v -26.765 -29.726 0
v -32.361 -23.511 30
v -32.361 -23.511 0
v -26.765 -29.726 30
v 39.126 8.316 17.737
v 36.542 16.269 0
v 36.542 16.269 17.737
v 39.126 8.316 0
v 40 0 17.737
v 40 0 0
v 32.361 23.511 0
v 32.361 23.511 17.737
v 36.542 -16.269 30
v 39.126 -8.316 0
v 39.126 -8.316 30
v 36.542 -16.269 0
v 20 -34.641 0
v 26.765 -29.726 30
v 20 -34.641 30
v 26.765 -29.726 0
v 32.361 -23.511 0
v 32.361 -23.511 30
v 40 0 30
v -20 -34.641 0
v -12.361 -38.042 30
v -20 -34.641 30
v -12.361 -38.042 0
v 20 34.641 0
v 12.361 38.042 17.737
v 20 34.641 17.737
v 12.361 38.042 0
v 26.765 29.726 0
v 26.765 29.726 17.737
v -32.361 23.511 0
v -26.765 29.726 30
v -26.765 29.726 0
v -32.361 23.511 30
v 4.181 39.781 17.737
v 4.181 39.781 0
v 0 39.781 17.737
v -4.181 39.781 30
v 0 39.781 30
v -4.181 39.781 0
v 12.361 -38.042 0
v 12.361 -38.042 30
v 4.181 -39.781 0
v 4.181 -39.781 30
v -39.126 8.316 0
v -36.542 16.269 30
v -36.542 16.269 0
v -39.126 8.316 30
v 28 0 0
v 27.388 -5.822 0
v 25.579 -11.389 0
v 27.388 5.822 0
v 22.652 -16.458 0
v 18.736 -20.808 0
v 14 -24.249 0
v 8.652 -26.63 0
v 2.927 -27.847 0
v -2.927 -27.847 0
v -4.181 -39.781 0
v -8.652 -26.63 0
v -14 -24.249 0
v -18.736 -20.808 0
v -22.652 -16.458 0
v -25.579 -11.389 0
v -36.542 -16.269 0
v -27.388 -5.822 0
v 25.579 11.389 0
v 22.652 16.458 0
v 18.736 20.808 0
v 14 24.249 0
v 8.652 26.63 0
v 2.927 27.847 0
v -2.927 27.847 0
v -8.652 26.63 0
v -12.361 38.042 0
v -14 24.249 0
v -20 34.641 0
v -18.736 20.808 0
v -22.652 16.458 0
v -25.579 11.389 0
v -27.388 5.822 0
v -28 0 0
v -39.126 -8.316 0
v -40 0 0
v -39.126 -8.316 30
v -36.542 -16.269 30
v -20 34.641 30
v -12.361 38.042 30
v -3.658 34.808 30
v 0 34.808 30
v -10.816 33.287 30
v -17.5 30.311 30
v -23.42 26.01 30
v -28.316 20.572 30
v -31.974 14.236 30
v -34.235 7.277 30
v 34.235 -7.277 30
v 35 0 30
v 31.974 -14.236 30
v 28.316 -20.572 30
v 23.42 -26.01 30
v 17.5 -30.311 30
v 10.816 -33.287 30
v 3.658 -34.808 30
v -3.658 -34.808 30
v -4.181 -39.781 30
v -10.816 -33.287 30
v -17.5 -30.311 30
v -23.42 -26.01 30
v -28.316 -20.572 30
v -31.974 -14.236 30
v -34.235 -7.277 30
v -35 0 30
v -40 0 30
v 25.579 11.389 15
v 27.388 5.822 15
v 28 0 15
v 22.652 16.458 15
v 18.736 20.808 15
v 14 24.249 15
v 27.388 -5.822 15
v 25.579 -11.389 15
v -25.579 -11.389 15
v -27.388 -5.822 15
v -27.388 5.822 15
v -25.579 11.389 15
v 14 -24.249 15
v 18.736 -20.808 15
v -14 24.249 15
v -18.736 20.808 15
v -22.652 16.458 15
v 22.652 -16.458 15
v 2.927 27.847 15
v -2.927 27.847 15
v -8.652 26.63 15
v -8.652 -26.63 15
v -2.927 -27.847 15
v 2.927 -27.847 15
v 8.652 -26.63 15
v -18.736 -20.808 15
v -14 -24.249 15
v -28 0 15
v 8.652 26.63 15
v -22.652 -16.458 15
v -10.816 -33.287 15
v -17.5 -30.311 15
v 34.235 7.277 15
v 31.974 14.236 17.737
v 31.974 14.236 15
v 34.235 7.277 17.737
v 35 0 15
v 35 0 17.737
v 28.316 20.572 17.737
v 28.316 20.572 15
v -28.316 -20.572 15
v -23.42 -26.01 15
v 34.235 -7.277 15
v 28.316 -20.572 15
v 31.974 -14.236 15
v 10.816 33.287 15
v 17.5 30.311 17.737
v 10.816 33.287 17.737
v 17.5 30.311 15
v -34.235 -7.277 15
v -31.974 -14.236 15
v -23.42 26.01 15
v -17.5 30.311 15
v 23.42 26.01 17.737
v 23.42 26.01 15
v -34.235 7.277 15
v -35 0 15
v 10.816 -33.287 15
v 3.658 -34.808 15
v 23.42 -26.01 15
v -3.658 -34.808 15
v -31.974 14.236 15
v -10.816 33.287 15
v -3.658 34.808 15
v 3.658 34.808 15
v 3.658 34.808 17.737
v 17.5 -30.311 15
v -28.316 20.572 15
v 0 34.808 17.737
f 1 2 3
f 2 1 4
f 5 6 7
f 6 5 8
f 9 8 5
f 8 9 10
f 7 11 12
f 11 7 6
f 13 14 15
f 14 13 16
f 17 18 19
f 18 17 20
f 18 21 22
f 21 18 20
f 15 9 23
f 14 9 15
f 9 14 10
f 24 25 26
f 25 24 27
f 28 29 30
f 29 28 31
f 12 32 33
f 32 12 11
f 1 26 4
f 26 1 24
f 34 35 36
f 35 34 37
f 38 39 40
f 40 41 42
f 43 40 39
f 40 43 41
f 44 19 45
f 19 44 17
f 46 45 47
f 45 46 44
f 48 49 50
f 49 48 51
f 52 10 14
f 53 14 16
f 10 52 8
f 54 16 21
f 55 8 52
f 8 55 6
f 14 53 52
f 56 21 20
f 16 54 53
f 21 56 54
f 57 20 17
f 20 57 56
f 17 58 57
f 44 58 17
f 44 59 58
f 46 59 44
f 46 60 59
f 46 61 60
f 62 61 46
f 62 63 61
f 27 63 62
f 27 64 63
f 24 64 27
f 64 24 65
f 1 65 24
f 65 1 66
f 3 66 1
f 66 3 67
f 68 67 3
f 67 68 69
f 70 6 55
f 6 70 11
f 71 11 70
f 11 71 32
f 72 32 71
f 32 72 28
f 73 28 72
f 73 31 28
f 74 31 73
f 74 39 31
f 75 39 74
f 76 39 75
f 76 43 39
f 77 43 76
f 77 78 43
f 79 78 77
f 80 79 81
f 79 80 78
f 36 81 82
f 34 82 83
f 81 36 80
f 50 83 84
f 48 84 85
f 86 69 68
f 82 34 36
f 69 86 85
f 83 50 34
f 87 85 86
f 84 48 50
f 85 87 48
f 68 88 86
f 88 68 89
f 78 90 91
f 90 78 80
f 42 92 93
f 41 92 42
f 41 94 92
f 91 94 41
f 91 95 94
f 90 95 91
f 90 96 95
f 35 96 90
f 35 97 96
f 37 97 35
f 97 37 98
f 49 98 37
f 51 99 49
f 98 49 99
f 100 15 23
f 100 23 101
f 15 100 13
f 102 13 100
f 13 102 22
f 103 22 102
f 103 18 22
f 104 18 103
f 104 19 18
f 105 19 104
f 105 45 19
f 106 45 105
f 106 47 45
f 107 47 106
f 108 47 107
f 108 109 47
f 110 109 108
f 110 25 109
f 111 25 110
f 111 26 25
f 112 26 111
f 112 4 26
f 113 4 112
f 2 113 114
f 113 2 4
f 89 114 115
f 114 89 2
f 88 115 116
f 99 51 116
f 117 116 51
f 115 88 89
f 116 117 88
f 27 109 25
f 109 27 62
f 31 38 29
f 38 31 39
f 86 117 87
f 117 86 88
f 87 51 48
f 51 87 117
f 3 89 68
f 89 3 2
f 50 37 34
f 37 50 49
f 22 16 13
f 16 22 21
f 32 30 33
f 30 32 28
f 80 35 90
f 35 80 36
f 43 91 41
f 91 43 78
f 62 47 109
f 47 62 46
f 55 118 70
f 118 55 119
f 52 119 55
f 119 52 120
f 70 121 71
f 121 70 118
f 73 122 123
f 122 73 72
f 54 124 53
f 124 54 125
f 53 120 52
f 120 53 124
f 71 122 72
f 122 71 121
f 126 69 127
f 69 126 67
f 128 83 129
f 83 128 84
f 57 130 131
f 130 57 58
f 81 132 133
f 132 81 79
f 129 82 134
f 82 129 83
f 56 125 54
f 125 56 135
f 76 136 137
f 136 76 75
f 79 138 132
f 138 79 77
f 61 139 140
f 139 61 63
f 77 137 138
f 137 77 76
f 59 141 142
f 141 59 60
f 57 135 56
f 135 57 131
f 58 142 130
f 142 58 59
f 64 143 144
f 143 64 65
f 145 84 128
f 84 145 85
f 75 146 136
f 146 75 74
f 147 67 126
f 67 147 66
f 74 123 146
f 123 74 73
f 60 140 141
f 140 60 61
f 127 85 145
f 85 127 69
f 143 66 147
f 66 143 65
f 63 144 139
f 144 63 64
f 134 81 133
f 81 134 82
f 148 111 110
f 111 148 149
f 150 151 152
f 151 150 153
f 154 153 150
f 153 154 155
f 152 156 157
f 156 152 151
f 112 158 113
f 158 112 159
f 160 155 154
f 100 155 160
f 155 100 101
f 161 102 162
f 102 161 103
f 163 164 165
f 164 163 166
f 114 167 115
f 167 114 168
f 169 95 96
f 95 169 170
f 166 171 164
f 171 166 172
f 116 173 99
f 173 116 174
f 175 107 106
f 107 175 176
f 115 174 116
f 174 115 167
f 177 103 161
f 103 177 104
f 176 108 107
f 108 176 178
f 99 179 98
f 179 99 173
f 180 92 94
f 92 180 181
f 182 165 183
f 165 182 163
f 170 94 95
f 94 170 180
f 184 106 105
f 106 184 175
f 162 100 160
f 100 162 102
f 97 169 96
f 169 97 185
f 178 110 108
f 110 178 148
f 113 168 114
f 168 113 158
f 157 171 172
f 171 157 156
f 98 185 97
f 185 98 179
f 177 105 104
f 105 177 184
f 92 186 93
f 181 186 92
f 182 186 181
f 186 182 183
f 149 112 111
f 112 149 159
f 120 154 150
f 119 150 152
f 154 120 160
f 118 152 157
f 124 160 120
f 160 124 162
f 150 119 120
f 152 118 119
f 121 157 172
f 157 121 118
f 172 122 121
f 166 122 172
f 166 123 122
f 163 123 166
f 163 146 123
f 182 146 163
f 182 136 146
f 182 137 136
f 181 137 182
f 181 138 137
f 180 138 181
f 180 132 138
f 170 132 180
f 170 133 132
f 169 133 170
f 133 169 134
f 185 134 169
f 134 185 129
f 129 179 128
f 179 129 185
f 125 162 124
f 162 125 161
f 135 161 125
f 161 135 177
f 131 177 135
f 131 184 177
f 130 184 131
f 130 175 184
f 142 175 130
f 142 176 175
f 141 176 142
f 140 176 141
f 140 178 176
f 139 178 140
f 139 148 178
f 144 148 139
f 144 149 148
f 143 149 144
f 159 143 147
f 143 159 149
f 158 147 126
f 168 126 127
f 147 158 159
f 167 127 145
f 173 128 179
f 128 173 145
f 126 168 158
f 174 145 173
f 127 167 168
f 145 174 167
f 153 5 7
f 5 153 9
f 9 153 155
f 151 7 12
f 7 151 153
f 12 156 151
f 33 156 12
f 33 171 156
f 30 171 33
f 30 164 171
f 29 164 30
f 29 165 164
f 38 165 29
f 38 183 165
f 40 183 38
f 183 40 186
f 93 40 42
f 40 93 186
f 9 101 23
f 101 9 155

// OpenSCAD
// Peristaltic Planetary Gear Pump

include <MCAD/involute_gears.scad>

render_part=0; // full_assembly
// render_part=1; // drive_gears
// render_part=2; // alignment_gears
// render_part=3; // pressure_rollers
// render_part=4; // outer_pressure_ring
// render_part=5; // roller_retainer_ring
// render_part=6; // roller_gear_coupler2bearing_group
// render_part=7; // pressure_roller_coupler2bearing_group 
render_part=8; // pump_body

module spider_coupler(
	thickness=5.0
	, outer_d=12.0
	, axle_d=3.0
	, bevel_dr=0.5
	, shrink=0.2
	) {
  intersection() {
    union() {
      cylinder(r=outer_d/2,h=thickness-bevel_dr,center=false);
      translate([0,0,thickness-bevel_dr])
        cylinder(r1=outer_d/2,r2=outer_d/2-bevel_dr,h=bevel_dr,center=false);
    }
    difference() {
      union() {
	  translate([shrink,shrink])
		cube(size=[outer_d/2-shrink,outer_d/2-shrink,thickness],center=false);
	  rotate([0,0,180]) translate([shrink,shrink,0])
		cube(size=[outer_d/2-shrink,outer_d/2-shrink,thickness],center=false);
	 }
	 union() {
	  translate([0,0,-bevel_dr]) cylinder(r=axle_d/2,h=thickness+2*bevel_dr,center=false);
	  translate([0,0,thickness-bevel_dr])  cylinder(r2=axle_d/2+2*bevel_dr,r1=axle_d/2,h=2*bevel_dr,center=false);
	  translate([0,0,thickness]) rotate([45,0,0]) cube(size=[outer_d,2*bevel_dr,2*bevel_dr],center=true);
	  translate([0,0,thickness]) rotate([45,0,90]) cube(size=[outer_d,2*bevel_dr,2*bevel_dr],center=true);
	 }
    }
  }
}

module roller_drive_gear(
	gear_d=20.0, gear_num_teeth=17, gear_spacing=1.0
	, roller_gear_thickness=10.0, motor_gear_thickness=12.0
	, roller_gear_hub_thickness=15.0, motor_gear_hub_thickness=17.0
	, roller_gear_hub_d=12.0, motor_gear_hub_d=15.0
	, roller_axle_d=3.0, motor_axle_d=5.0
	, roller_gear_count=3
	, gear_clearance=0.4
	, twist_ratio=0.5, bevel_dr=0.5
	) {
  $fs=0.1;
  gear_circular_pitch=gear_d * 180 / gear_num_teeth;
  difference() {
    intersection() {
	gear(number_of_teeth=gear_num_teeth
		, circular_pitch=gear_circular_pitch
		, gear_thickness=roller_gear_thickness, rim_thickness=roller_gear_thickness
		, bore_diameter=roller_axle_d
		, clearance=gear_clearance/2
		, hub_thickness=0
		, hub_diameter=roller_gear_hub_d
		);
	cylinder(r1=gear_d/2,r2=gear_d/2+roller_gear_thickness,h=roller_gear_thickness,center=false);
	cylinder(r2=gear_d/2,r1=gear_d/2+roller_gear_thickness,h=roller_gear_thickness,center=false);
    }
    translate([0,0,gear_thickness+bevel_dr]) rotate([180,0,0])
	    translate([0,0,-bevel_dr]) spider_coupler( thickness=(roller_gear_hub_thickness-roller_gear_thickness)/2+2*bevel_dr
		, outer_d=gear_hub_d+2*bevel_dr, axle_d=roller_axle_d-2*bevel_dr, bevel_dr=bevel_dr/2,shrink=-0.2 );
  }
  translate([0,0,gear_thickness]) 
	  spider_coupler( thickness=(roller_gear_hub_thickness-roller_gear_thickness)/2
		, outer_d=gear_hub_d, axle_d=roller_axle_d, bevel_dr=bevel_dr,shrink=0.2 );
}

module drive_gears(
	gear_d=20.0, gear_num_teeth=17, gear_spacing=1.0
	, roller_gear_thickness=10.0, motor_gear_thickness=12.0
	, roller_gear_hub_thickness=15.0, motor_gear_hub_thickness=17.0
	, roller_gear_hub_d=12.0, motor_gear_hub_d=15.0
	, roller_axle_d=3.0, motor_axle_d=5.0
	, roller_gear_count=3
	, gear_clearance=0.4
	, twist_ratio=0.5, bevel_dr=0.5
	) {
  $fs=0.1;
  // Motor gear at center
  gear_circular_pitch=gear_d * 180 / gear_num_teeth;
  intersection() {
    gear(number_of_teeth=gear_num_teeth
	, circular_pitch=gear_circular_pitch
	, gear_thickness=motor_gear_thickness, rim_thickness=motor_gear_thickness
	, bore_diameter=motor_axle_d
	, clearance=gear_clearance/2
	, hub_thickness=motor_gear_hub_thickness
	, hub_diameter=motor_gear_hub_d
	);
    cylinder(r1=gear_d/2,r2=gear_d/2+motor_gear_hub_thickness,h=motor_gear_hub_thickness,center=false);
//    cylinder(r2=gear_d/2,r1=gear_d/2+motor_gear_thickness,h=motor_gear_thickness,center=false);
  }
  for(i=[0:roller_gear_count-1]) assign( rotAngle=360*i/roller_gear_count ) {
    rotate([0,0,rotAngle]) translate([gear_d+gear_clearance+gear_spacing,0,0]) rotate([0,0,-2*rotAngle])
	  roller_drive_gear(
		gear_d=gear_d, gear_num_teeth=gear_num_teeth, gear_thickness=roller_gear_thickness, gear_spacing=gear_spacing
		, gear_hub_thickness=roller_gear_hub_thickness, gear_hub_d=roller_gear_hub_d, roller_axle_d=roller_axle_d
		, gear_clearance=gear_clearance, twist_ratio=twist_ratio, bevel_dr=bevel_dr
	  );

  }
}

if(render_part==1) {
  echo("Rendering drive_gears()...");
  drive_gears(gear_spacing=2.0);
}

module alignment_gear_middle(
	gear_d=20.0, gear_num_teeth=17, gear_thickness=12.0, gear_spacing=1.0
	, gear_hub_thickness=15.0, gear_hub_d=12.0, middle_axle_d=5.0
	, gear_clearance=0.4, twist_ratio=0.5, bevel_dr=0.5
	) {
  $fs=0.1;
  gear_circular_pitch=gear_d * 180 / gear_num_teeth;
  union() {
    intersection() {
	gear(number_of_teeth=gear_num_teeth
	  , circular_pitch=gear_circular_pitch
	  , gear_thickness=gear_thickness/2, rim_thickness=gear_thickness/2
	  , bore_diameter=middle_axle_d
	  , clearance=gear_clearance/2
	  , hub_thickness=0
	  , hub_diameter=gear_hub_d
	  , twist=twist_ratio*180/gear_num_teeth
	  );
	cylinder(r1=gear_d/2,r2=gear_d/2+gear_thickness/2,h=gear_thickness/2,center=false);
	cylinder(r2=gear_d/2,r1=gear_d/2+gear_thickness/2,h=gear_thickness/2,center=false);
    }
    translate([0,0,gear_thickness/2]) rotate([0,0,-twist_ratio*180/gear_num_teeth]) difference() {
	intersection() {
	  gear(number_of_teeth=gear_num_teeth
		, circular_pitch=gear_circular_pitch
		, gear_thickness=gear_thickness/2, rim_thickness=gear_thickness/2
		, bore_diameter=middle_axle_d
		, clearance=gear_clearance/2
		, hub_thickness=0
		, hub_diameter=gear_hub_d
		, twist=-twist_ratio*180/gear_num_teeth
		);
	  cylinder(r1=gear_d/2,r2=gear_d/2+gear_thickness/2,h=gear_thickness/2,center=false);
	  cylinder(r2=gear_d/2,r1=gear_d/2+gear_thickness/2,h=gear_thickness/2,center=false);
	}
	  translate([0,0,gear_thickness/2]) rotate([180,0,twist_ratio*180/gear_num_teeth])
	    translate([0,0,-bevel_dr]) spider_coupler( thickness=(gear_hub_thickness-gear_thickness)/2+2*bevel_dr
		, outer_d=gear_hub_d+2*bevel_dr, axle_d=middle_axle_d-2*bevel_dr, bevel_dr=bevel_dr/2,shrink=-0.2 );
	}
	translate([0,0,gear_thickness]) 
	  spider_coupler( thickness=(gear_hub_thickness-gear_thickness)/2
		, outer_d=gear_hub_d, axle_d=middle_axle_d, bevel_dr=bevel_dr,shrink=0.2 );
  }
}

module alignment_gear_roller(
	gear_d=20.0, gear_num_teeth=17, gear_thickness=12.0, gear_spacing=1.0
	, gear_hub_thickness=15.0, gear_hub_d=12.0
	, roller_axle_d=3.0
	, roller_gear_count=3
	, gear_clearance=0.4
	, twist_ratio=0.5
	, bevel_dr=0.5
	) {
  $fs=0.1;
  gear_circular_pitch=gear_d * 180 / gear_num_teeth;
  intersection() {
	gear(number_of_teeth=gear_num_teeth
		, circular_pitch=gear_circular_pitch
		, gear_thickness=gear_thickness/2, rim_thickness=gear_thickness/2
		, bore_diameter=roller_axle_d
		, clearance=gear_clearance/2
		, hub_thickness=0
		, hub_diameter=gear_hub_d
		, twist=-twist_ratio*180/gear_num_teeth
		);
	cylinder(r1=gear_d/2,r2=gear_d/2+gear_thickness/2,h=gear_thickness/2,center=false);
	cylinder(r2=gear_d/2,r1=gear_d/2+gear_thickness/2,h=gear_thickness/2,center=false);
  }
  translate([0,0,gear_thickness/2]) rotate([0,0,twist_ratio*180/gear_num_teeth]) difference() {
    intersection() {
	  gear(number_of_teeth=gear_num_teeth
		, circular_pitch=gear_circular_pitch
		, gear_thickness=gear_thickness/2, rim_thickness=gear_thickness/2
		, bore_diameter=roller_axle_d
		, clearance=gear_clearance/2
		, hub_thickness=0
		, hub_diameter=gear_hub_d
		, twist=twist_ratio*180/gear_num_teeth
	  );
	cylinder(r1=gear_d/2,r2=gear_d/2+gear_thickness/2,h=gear_thickness/2,center=false);
	cylinder(r2=gear_d/2,r1=gear_d/2+gear_thickness/2,h=gear_thickness/2,center=false);
    }
    translate([0,0,gear_thickness/2]) rotate([180,0,-twist_ratio*180/gear_num_teeth])
      translate([0,0,-bevel_dr]) spider_coupler( thickness=(gear_hub_thickness-gear_thickness)/2+2*bevel_dr
		, outer_d=gear_hub_d+2*bevel_dr, axle_d=roller_axle_d-2*bevel_dr, bevel_dr=bevel_dr/2,shrink=-0.2 );
  }
	translate([0,0,gear_thickness]) 
	  spider_coupler( thickness=(gear_hub_thickness-gear_thickness)/2
		, outer_d=gear_hub_d, axle_d=roller_axle_d, bevel_dr=bevel_dr );
}

module alignment_gears(
	gear_d=20.0, gear_num_teeth=17, gear_thickness=12.0, gear_spacing=1.0
	, gear_hub_thickness=15.0, gear_hub_d=12.0
	, roller_axle_d=3.0, middle_axle_d=5.0
	, roller_gear_count=3
	, gear_clearance=0.4
	, twist_ratio=0.5
	, bevel_dr=0.5
	) {
  $fs=0.1;
  gear_circular_pitch=gear_d * 180 / gear_num_teeth;
  // Motor gear at center
  alignment_gear_middle(
	gear_d=gear_d, gear_num_teeth=gear_num_teeth, gear_thickness=gear_thickness, gear_spacing=gear_spacing
	, gear_hub_thickness=gear_hub_thickness, gear_hub_d=gear_hub_d, middle_axle_d=middle_axle_d
	, gear_clearance=gear_clearance, twist_ratio=twist_ratio, bevel_dr=bevel_dr
	);
  for(i=[0:roller_gear_count-1]) assign( rotAngle=360*i/roller_gear_count ) {
    rotate([0,0,rotAngle]) translate([gear_d+gear_clearance+gear_spacing,0,0]) rotate([0,0,-2*rotAngle])
	  alignment_gear_roller(
		gear_d=gear_d, gear_num_teeth=gear_num_teeth, gear_thickness=gear_thickness, gear_spacing=gear_spacing
		, gear_hub_thickness=gear_hub_thickness, gear_hub_d=gear_hub_d, roller_axle_d=roller_axle_d
		, gear_clearance=gear_clearance, twist_ratio=twist_ratio, bevel_dr=bevel_dr
	  );
  }
}

if(render_part==2) {
  echo("Rendering alignment_gears()...");
  alignment_gears(gear_spacing=2.0);
}

module pressure_roller(
	roller_axle_d=3.0, roller_thickness=15.0
	, roller_coupler_thickness=3.0, roller_coupler_d=12.0
	, roller_shield_d=20.0, roller_shield_thickness=3.0
	, roller_min_d=15.0, roller_max_d=18.0
	, bevel_dr=0.5
	) {
  $fs=0.1;
  difference() {
    union() {
	cylinder(r=roller_max_d/2,h=roller_shield_thickness,center=false);
	translate([0,0,roller_shield_thickness])
	  cylinder(r1=roller_max_d/2,r2=roller_min_d/2,h=roller_thickness,center=false);
	translate([0,0,roller_shield_thickness+roller_thickness])
	  cylinder(r=roller_min_d/2,h=roller_shield_thickness,center=false);
//	translate([0,0,roller_shield_thickness+roller_thickness+(roller_shield_d/2-roller_min_d/2)])
//	  cylinder(r=roller_shield_d/2,h=roller_shield_thickness-(roller_shield_d/2-roller_min_d/2),center=false);
	translate([0,0,2*roller_shield_thickness+roller_thickness])
	  spider_coupler( thickness=roller_coupler_thickness/2
		, outer_d=roller_coupler_d, axle_d=roller_axle_d, bevel_dr=bevel_dr,shrink=0.2 );
    }
    translate([0,0,-bevel_dr]) cylinder(r=roller_axle_d/2
	,h=2*bevel_dr+2*roller_shield_thickness+roller_thickness,center=false);
    translate([0,0,-bevel_dr]) spider_coupler( thickness=roller_coupler_thickness/2+2*bevel_dr
		, outer_d=roller_coupler_d+2*bevel_dr, axle_d=roller_axle_d-2*bevel_dr, bevel_dr=bevel_dr/2,shrink=-0.2 );
    translate([0,0,2*roller_shield_thickness+roller_thickness+bevel_dr]) rotate([180,0,0])
	  spider_coupler( thickness=roller_coupler_thickness/2+2*bevel_dr
		, outer_d=roller_coupler_d+2*bevel_dr, axle_d=roller_axle_d-2*bevel_dr, bevel_dr=bevel_dr/2,shrink=-0.2 );
  }
}

module pump_pressure_rollers(
	roller_axle_d=3.0, roller_thickness=15.0
	, roller_coupler_thickness=3.0, roller_coupler_d=12.0
	, roller_shield_d=20.0, roller_shield_thickness=3.0
	, roller_min_d=15.0, roller_max_d=18.0
	, pressure_roller_count=3
	, bevel_dr=0.5
	, gear_d=20.0, gear_clearance=0.4, gear_spacing=1.0
	) {
  $fs=0.1;
  for(i=[0:pressure_roller_count-1]) assign( rotAngle=360*i/pressure_roller_count ) {
    rotate([0,0,rotAngle]) translate([gear_d+gear_clearance+gear_spacing,0,0]) rotate([0,0,-2*rotAngle])
	  pressure_roller(
		roller_axle_d=roller_axle_d, roller_thickness=roller_thickness
		, roller_coupler_thickness=roller_coupler_thickness, roller_coupler_d=roller_coupler_d
		, roller_shield_d=roller_shield_d, roller_shield_thickness=roller_shield_thickness
		, roller_min_d=roller_min_d, roller_max_d=roller_max_d
		, bevel_dr=bevel_dr
	  );
  }
}

if(render_part==3) {
  echo("Rendering pump_pressure_rollers()...");
  pump_pressure_rollers(gear_spacing=2.0);
}

function Tygon_B_44_3_OD()=25.4*3/16; // Outer Diameter
function Tygon_B_44_3_ID()=25.4*1/16; // Inner Diameter
function Tygon_B_44_3_WT()=25.4*1/16; // Wall Thickness
function Tygon_B_44_3_minBR()=25.4*1/8; // minimum Bend Radius

module outer_pressure_ring(
	roller_axle_d=3.0, roller_thickness=15.0
	, roller_coupler_thickness=3.0, roller_coupler_d=12.0
	, roller_shield_d=20.0, roller_shield_thickness=3.0
	, roller_min_d=15.0, roller_max_d=18.0
	, pressure_roller_count=3
	, bevel_dr=0.5
	, gear_d=20.0, gear_clearance=0.4, gear_spacing=1.0
	, tube_outer_d=Tygon_B_44_3_OD()
	, tube_inner_d=Tygon_B_44_3_ID()
	, hole_ext=0.01
	) {
  $fs=0.1;
  dr1=gear_d+roller_min_d/2+tube_outer_d-tube_inner_d;
  dr2=gear_d+roller_max_d/2+tube_outer_d-tube_inner_d;
  difference() {
    cylinder(r=gear_d+3*roller_shield_d/4,h=3*roller_thickness/2,center=false);
    translate([0,0,-hole_ext]) cylinder(r=dr2,h=3*roller_thickness/2+2*hole_ext,center=false);
    translate([0,0,roller_thickness/8+roller_thickness/2-tube_outer_d])
	cube(size=[gear_d+roller_shield_d+2*bevel_dr,gear_d+roller_shield_d+2*bevel_dr,2*tube_outer_d],center=false);
  }
  // bottom section
  difference() {
    cylinder(r=gear_d+roller_shield_d,h=roller_thickness/8,center=false);
    translate([0,0,-hole_ext]) cylinder(r=gear_d+roller_min_d/2+bevel_dr,h=roller_thickness/8+2*hole_ext,center=false);
  }
  translate([0,0,roller_thickness/8]) difference() {
    cylinder(r=gear_d+3*roller_shield_d/4,h=roller_thickness/2-tube_outer_d,center=false);
    cylinder(r1=gear_d+roller_min_d/2+bevel_dr,r2=dr1+(dr2-dr1)*(roller_thickness/2-tube_outer_d)/roller_thickness
	  ,h=roller_thickness/2-tube_outer_d,center=false);
    cylinder(r=gear_d+roller_min_d/2+bevel_dr,h=hole_ext,center=true);
    translate([0,0,roller_thickness/2-tube_outer_d]) cylinder(r=dr1+(dr2-dr1)*(roller_thickness/2-tube_outer_d)/roller_thickness,h=hole_ext,center=true);
  }
  translate([0,0,roller_thickness/8+roller_thickness/2-tube_outer_d]) difference() {
    cylinder(r=gear_d+3*roller_shield_d/4,h=2*tube_outer_d,center=false);
    translate([0,0,tube_outer_d]) cylinder(r1=dr1,r2=dr2,h=roller_thickness,center=true);
    cube(size=[gear_d+roller_shield_d+2*bevel_dr,gear_d+roller_shield_d+2*bevel_dr,2*tube_outer_d],center=false);
  }
//  translate([0,0,roller_thickness/8+roller_thickness/2+tube_outer_d]) difference() {
//    cylinder(r=gear_d+3*roller_shield_d/4,h=roller_thickness/2-tube_outer_d, center=false);
//    cylinder(r1=dr1+(dr2-dr1)*(roller_thickness/2+tube_outer_d)/roller_thickness
//	    ,r2=gear_d+roller_max_d/2+bevel_dr,h=roller_thickness/2-tube_outer_d+bevel_dr,center=false);
//  }
//  translate([0,0,9*roller_thickness/8]) difference() {
//    cylinder(r=gear_d+3*roller_shield_d/4,h=roller_thickness/4,center=false);
//    translate([0,0,-bevel_dr]) cylinder(r=gear_d+roller_max_d/2+2*bevel_dr,h=roller_thickness/4+2*bevel_dr,center=false);
//  }
}

if(render_part==4) {
  echo("Rendering outer_pressure_ring()...");
  % translate([0,0,23]) rotate([180,0,0]) pump_pressure_rollers(gear_spacing=0.0);
  outer_pressure_ring(gear_spacing=0.0);
}

function Bearing_623_OD()=10.0; // outer diameter
function Bearing_623_ID()=3.0; // inner diameter
function Bearing_623_TH()=4.0; // thickness


module roller_retainer_ring(
	roller_axle_d=3.0, roller_thickness=15.0
	, roller_coupler_thickness=3.0, roller_coupler_d=12.0
	, roller_shield_d=20.0, roller_shield_thickness=3.0
	, roller_min_d=15.0, roller_max_d=18.0
	, pressure_roller_count=3
	, bevel_dr=0.5
	, gear_d=20.0, gear_clearance=0.4, gear_spacing=1.0
	, tube_outer_d=Tygon_B_44_3_OD()
	, tube_inner_d=Tygon_B_44_3_ID()
	, hole_ext=0.01
	, roller_bearing_od=Bearing_623_OD(), roller_bearing_th=Bearing_623_TH()
	) {
  $fs=0.1;
  difference() {
    cylinder(r=gear_d+roller_min_d/2,h=roller_bearing_th,center=false);
    cylinder(r=gear_d-roller_shield_d/2,h=roller_bearing_th,center=false);
    cylinder(r1=gear_d-roller_shield_d/2+3*bevel_dr,r2=gear_d-roller_shield_d/2,h=3*bevel_dr,center=true);
    translate([0,0,roller_bearing_th])
      cylinder(r2=gear_d-roller_shield_d/2+3*bevel_dr,r1=gear_d-roller_shield_d/2,h=3*bevel_dr,center=true);

    for(i=[0:pressure_roller_count-1]) assign( rotAngle=360*i/pressure_roller_count ) {
      rotate([0,0,rotAngle]) translate([gear_d,0,0]) {
	  cylinder(r=roller_bearing_od/2,h=roller_bearing_th,center=false);
	  cylinder(r1=roller_bearing_od/2+2*bevel_dr,r2=roller_bearing_od/2,h=2*bevel_dr,center=true);
	  translate([0,0,roller_bearing_th])
	    cylinder(r2=roller_shield_d/2+3*bevel_dr,r1=roller_shield_d/2+bevel_dr,h=2*bevel_dr,center=true);
      }
    }
  }
}

if(render_part==5) {
  echo("Rendering roller_retainer_ring()...");
  % translate([0,0,30]) rotate([180,0,0]) pump_pressure_rollers(gear_spacing=0.0);
  roller_retainer_ring(gear_spacing=0.0);
}

module roller_gear_coupler2bearing(
	roller_axle_d=3.0, roller_thickness=15.0
	, roller_coupler_thickness=3.0, roller_coupler_d=12.0
	, roller_shield_d=20.0, roller_shield_thickness=3.0
	, roller_min_d=15.0, roller_max_d=18.0
	, pressure_roller_count=3
	, bevel_dr=0.5
	, gear_d=20.0, gear_clearance=0.4, gear_spacing=1.0
	, tube_outer_d=Tygon_B_44_3_OD()
	, tube_inner_d=Tygon_B_44_3_ID()
	, hole_ext=0.01
	, roller_bearing_od=Bearing_623_OD(), roller_bearing_th=Bearing_623_TH()
	) {
  $fs=0.1;
  difference() {
    union() {
      cylinder(r=roller_max_d/2,h=roller_shield_thickness/2,center=false);
      translate([0,0,roller_shield_thickness/2])
		cylinder(r1=roller_max_d/2,r2=(roller_axle_d+(roller_bearing_od-roller_axle_d)/2)/2,h=roller_shield_thickness/2,center=false);
	 // translate([0,0,roller_shield_thickness]) 
	 //   spider_coupler( thickness=roller_coupler_thickness/2
	 //     , outer_d=roller_coupler_d, axle_d=roller_axle_d, bevel_dr=bevel_dr,shrink=0.2 );
    }
    translate([0,0,-hole_ext]) cylinder(r=roller_axle_d/2,h=roller_shield_thickness+2*hole_ext,center=false);
    translate([0,0,-bevel_dr]) spider_coupler( thickness=roller_coupler_thickness/2+2*bevel_dr
		, outer_d=roller_coupler_d+2*bevel_dr, axle_d=roller_axle_d-2*bevel_dr, bevel_dr=bevel_dr/2,shrink=-0.2 );
  }
}

module roller_gear_coupler2bearing_group(
	roller_axle_d=3.0, roller_thickness=15.0
	, roller_coupler_thickness=3.0, roller_coupler_d=12.0
	, roller_shield_d=20.0, roller_shield_thickness=3.0
	, roller_min_d=15.0, roller_max_d=18.0
	, pressure_roller_count=3
	, bevel_dr=0.5
	, gear_d=20.0, gear_clearance=0.4, gear_spacing=1.0
	, tube_outer_d=Tygon_B_44_3_OD()
	, tube_inner_d=Tygon_B_44_3_ID()
	, hole_ext=0.01
	, roller_bearing_od=Bearing_623_OD(), roller_bearing_th=Bearing_623_TH()
	) {
  $fs=0.1;
  for(i=[0:pressure_roller_count-1]) assign( rotAngle=360*i/pressure_roller_count ) {
    rotate([0,0,rotAngle]) translate([gear_d+gear_clearance+gear_spacing,0,0]) rotate([0,0,-2*rotAngle])
	  roller_gear_coupler2bearing(
		roller_axle_d=roller_axle_d, roller_thickness=roller_thickness
		, roller_coupler_thickness=roller_coupler_thickness, roller_coupler_d=roller_coupler_d
		, roller_shield_d=roller_shield_d, roller_shield_thickness=roller_shield_thickness
		, roller_min_d=roller_min_d, roller_max_d=roller_max_d
		, bevel_dr=bevel_dr
		, gear_d=gear_d, gear_clearance=gear_clearance, gear_spacing=gear_spacing
		, tube_outer_d=tube_outer_d
		, tube_inner_d=tube_inner_d
		, hole_ext=hole_ext
		, roller_bearing_od=roller_bearing_od, roller_bearing_th=roller_bearing_th
	  );
  }
}

if(render_part==6) {
  echo("Rendering roller_gear_coupler2bearing_group()...");
  roller_gear_coupler2bearing_group(gear_spacing=2.0);
}

module pressure_roller_coupler2bearing(
	roller_axle_d=3.0, roller_thickness=15.0
	, roller_coupler_thickness=3.0, roller_coupler_d=12.0
	, roller_shield_d=20.0, roller_shield_thickness=3.0
	, roller_min_d=15.0, roller_max_d=18.0
	, pressure_roller_count=3
	, bevel_dr=0.5
	, gear_d=20.0, gear_clearance=0.4, gear_spacing=1.0
	, tube_outer_d=Tygon_B_44_3_OD()
	, tube_inner_d=Tygon_B_44_3_ID()
	, hole_ext=0.01
	, roller_bearing_od=Bearing_623_OD(), roller_bearing_th=Bearing_623_TH()
	) {
  $fs=0.1;
  intersection() {
   rotate([0,0,45]) translate([0,0,(roller_coupler_thickness/2+roller_shield_thickness)/2])
	cube(size=[roller_max_d/2-bevel_dr,roller_max_d,roller_coupler_thickness/2+roller_shield_thickness],center=true);
   difference() {
    union() {
      translate([0,0,roller_coupler_thickness/2]) {
	  rotate([180,0,0]) spider_coupler( thickness=roller_coupler_thickness/2
		, outer_d=roller_coupler_d, axle_d=roller_axle_d-2*bevel_dr, bevel_dr=bevel_dr/2,shrink=2*hole_ext );
	  intersection() {
	    cylinder(r=roller_coupler_d/2,h=roller_shield_thickness,center=false);
	    union() {
		  cylinder(r=roller_max_d/2,h=roller_shield_thickness/2,center=false);
		  translate([0,0,roller_shield_thickness/2])
			cylinder(r1=roller_max_d/2,r2=(roller_axle_d+(roller_bearing_od-roller_axle_d)/2)/2,h=roller_shield_thickness/2,center=false);
	    }
	  }
	 // translate([0,0,roller_shield_thickness]) 
	 //   spider_coupler( thickness=roller_coupler_thickness/2
	 //     , outer_d=roller_coupler_d, axle_d=roller_axle_d, bevel_dr=bevel_dr,shrink=2*hole_ext );
	}
    }
    translate([0,0,roller_coupler_thickness/2-hole_ext]) cylinder(r=roller_axle_d/2,h=roller_shield_thickness+2*hole_ext,center=false);
    // translate([0,0,roller_coupler_thickness/2-bevel_dr]) spider_coupler( thickness=roller_coupler_thickness/2+2*bevel_dr
	//	, outer_d=roller_coupler_d+2*bevel_dr, axle_d=roller_axle_d-2*bevel_dr, bevel_dr=bevel_dr/2,shrink=-2*hole_ext );
   }
  }
}


module pressure_roller_coupler2bearing_group(
	roller_axle_d=3.0, roller_thickness=15.0
	, roller_coupler_thickness=3.0, roller_coupler_d=12.0
	, roller_shield_d=20.0, roller_shield_thickness=3.0
	, roller_min_d=15.0, roller_max_d=18.0
	, pressure_roller_count=3
	, bevel_dr=0.5
	, gear_d=20.0, gear_clearance=0.4, gear_spacing=1.0
	, tube_outer_d=Tygon_B_44_3_OD()
	, tube_inner_d=Tygon_B_44_3_ID()
	, hole_ext=0.01
	, roller_bearing_od=Bearing_623_OD(), roller_bearing_th=Bearing_623_TH()
	) {
  $fs=0.1;
  for(i=[0:pressure_roller_count-1]) assign( rotAngle=360*i/pressure_roller_count ) {
    rotate([0,0,rotAngle]) translate([gear_d+gear_clearance+gear_spacing,0,0]) rotate([0,0,-2*rotAngle])
	  pressure_roller_coupler2bearing(
		roller_axle_d=roller_axle_d, roller_thickness=roller_thickness
		, roller_coupler_thickness=roller_coupler_thickness, roller_coupler_d=roller_coupler_d
		, roller_shield_d=roller_shield_d, roller_shield_thickness=roller_shield_thickness
		, roller_min_d=roller_min_d, roller_max_d=roller_max_d
		, bevel_dr=bevel_dr
		, gear_d=gear_d, gear_clearance=gear_clearance, gear_spacing=gear_spacing
		, tube_outer_d=tube_outer_d
		, tube_inner_d=tube_inner_d
		, hole_ext=hole_ext
		, roller_bearing_od=roller_bearing_od, roller_bearing_th=roller_bearing_th
	  );
  }
}

if(render_part==7) {
  echo("Rendering pressure_roller_coupler2bearing_group()...");
  pressure_roller_coupler2bearing_group(gear_spacing=2.0);
}

module pump_body(
	roller_axle_d=3.0, roller_thickness=15.0
	, roller_coupler_thickness=3.0, roller_coupler_d=12.0
	, roller_shield_d=20.0, roller_shield_thickness=3.0
	, roller_min_d=15.0, roller_max_d=18.0
	, pressure_roller_count=3
	, bevel_dr=0.5
	, gear_d=20.0, gear_clearance=0.4, gear_spacing=1.0
	, tube_outer_d=Tygon_B_44_3_OD()
	, tube_inner_d=Tygon_B_44_3_ID()
	, hole_ext=0.01
	) {
  $fs=0.1;
  dr1=gear_d+roller_min_d/2+tube_outer_d-tube_inner_d;
  dr2=gear_d+roller_max_d/2+tube_outer_d-tube_inner_d;
  difference() {
    cylinder(r=gear_d+roller_shield_d,h=2*roller_thickness,center=false);
    translate([0,0,-hole_ext]) cylinder(r=gear_d+roller_min_d/2+bevel_dr,h=2*roller_thickness+2*hole_ext,center=false);

    translate([0,0,roller_thickness]) cylinder(r=gear_d+3*roller_shield_d/4,h=roller_thickness+hole_ext,center=false);
    translate([0,0,3*roller_thickness/3+roller_thickness/2-tube_outer_d])
	cube(size=[gear_d+roller_shield_d+2*bevel_dr,gear_d+roller_shield_d+2*bevel_dr,roller_thickness],center=false);
  }
}

if(render_part==8) assign(roller_thickness=15.0,roller_shield_thickness=3.0) {
  echo("Rendering pump_body()...");
  % translate([0,0,2*roller_thickness+roller_thickness/4]) rotate([180,0,90]) outer_pressure_ring(gear_spacing=0.0);
  pump_body(gear_spacing=0.0);
}

if(render_part==0) {
  echo("Rendering full assembly...");
  drive_gears(gear_spacing=0.0);
  translate([0,0,13]) roller_gear_coupler2bearing_group(gear_spacing=0.0);
  translate([0,0,17]) roller_retainer_ring(gear_spacing=0.0);
  translate([0,0,26]) rotate([180,0,0]) pressure_roller_coupler2bearing_group(gear_spacing=0.0);
  translate([0,0,50]) rotate([180,0,0]) pump_pressure_rollers(gear_spacing=0.0);
  translate([0,0,29]) outer_pressure_ring(gear_spacing=0.0);
  translate([0,0,53]) roller_gear_coupler2bearing_group(gear_spacing=0.0);
  translate([0,0,60]) rotate([180,0,0]) roller_retainer_ring(gear_spacing=0.0);
  translate([0,0,65]) rotate([180,0,0]) roller_gear_coupler2bearing_group(gear_spacing=0.0);
  translate([0,0,80]) rotate([180,0,0]) alignment_gears(gear_spacing=0.0);
}
